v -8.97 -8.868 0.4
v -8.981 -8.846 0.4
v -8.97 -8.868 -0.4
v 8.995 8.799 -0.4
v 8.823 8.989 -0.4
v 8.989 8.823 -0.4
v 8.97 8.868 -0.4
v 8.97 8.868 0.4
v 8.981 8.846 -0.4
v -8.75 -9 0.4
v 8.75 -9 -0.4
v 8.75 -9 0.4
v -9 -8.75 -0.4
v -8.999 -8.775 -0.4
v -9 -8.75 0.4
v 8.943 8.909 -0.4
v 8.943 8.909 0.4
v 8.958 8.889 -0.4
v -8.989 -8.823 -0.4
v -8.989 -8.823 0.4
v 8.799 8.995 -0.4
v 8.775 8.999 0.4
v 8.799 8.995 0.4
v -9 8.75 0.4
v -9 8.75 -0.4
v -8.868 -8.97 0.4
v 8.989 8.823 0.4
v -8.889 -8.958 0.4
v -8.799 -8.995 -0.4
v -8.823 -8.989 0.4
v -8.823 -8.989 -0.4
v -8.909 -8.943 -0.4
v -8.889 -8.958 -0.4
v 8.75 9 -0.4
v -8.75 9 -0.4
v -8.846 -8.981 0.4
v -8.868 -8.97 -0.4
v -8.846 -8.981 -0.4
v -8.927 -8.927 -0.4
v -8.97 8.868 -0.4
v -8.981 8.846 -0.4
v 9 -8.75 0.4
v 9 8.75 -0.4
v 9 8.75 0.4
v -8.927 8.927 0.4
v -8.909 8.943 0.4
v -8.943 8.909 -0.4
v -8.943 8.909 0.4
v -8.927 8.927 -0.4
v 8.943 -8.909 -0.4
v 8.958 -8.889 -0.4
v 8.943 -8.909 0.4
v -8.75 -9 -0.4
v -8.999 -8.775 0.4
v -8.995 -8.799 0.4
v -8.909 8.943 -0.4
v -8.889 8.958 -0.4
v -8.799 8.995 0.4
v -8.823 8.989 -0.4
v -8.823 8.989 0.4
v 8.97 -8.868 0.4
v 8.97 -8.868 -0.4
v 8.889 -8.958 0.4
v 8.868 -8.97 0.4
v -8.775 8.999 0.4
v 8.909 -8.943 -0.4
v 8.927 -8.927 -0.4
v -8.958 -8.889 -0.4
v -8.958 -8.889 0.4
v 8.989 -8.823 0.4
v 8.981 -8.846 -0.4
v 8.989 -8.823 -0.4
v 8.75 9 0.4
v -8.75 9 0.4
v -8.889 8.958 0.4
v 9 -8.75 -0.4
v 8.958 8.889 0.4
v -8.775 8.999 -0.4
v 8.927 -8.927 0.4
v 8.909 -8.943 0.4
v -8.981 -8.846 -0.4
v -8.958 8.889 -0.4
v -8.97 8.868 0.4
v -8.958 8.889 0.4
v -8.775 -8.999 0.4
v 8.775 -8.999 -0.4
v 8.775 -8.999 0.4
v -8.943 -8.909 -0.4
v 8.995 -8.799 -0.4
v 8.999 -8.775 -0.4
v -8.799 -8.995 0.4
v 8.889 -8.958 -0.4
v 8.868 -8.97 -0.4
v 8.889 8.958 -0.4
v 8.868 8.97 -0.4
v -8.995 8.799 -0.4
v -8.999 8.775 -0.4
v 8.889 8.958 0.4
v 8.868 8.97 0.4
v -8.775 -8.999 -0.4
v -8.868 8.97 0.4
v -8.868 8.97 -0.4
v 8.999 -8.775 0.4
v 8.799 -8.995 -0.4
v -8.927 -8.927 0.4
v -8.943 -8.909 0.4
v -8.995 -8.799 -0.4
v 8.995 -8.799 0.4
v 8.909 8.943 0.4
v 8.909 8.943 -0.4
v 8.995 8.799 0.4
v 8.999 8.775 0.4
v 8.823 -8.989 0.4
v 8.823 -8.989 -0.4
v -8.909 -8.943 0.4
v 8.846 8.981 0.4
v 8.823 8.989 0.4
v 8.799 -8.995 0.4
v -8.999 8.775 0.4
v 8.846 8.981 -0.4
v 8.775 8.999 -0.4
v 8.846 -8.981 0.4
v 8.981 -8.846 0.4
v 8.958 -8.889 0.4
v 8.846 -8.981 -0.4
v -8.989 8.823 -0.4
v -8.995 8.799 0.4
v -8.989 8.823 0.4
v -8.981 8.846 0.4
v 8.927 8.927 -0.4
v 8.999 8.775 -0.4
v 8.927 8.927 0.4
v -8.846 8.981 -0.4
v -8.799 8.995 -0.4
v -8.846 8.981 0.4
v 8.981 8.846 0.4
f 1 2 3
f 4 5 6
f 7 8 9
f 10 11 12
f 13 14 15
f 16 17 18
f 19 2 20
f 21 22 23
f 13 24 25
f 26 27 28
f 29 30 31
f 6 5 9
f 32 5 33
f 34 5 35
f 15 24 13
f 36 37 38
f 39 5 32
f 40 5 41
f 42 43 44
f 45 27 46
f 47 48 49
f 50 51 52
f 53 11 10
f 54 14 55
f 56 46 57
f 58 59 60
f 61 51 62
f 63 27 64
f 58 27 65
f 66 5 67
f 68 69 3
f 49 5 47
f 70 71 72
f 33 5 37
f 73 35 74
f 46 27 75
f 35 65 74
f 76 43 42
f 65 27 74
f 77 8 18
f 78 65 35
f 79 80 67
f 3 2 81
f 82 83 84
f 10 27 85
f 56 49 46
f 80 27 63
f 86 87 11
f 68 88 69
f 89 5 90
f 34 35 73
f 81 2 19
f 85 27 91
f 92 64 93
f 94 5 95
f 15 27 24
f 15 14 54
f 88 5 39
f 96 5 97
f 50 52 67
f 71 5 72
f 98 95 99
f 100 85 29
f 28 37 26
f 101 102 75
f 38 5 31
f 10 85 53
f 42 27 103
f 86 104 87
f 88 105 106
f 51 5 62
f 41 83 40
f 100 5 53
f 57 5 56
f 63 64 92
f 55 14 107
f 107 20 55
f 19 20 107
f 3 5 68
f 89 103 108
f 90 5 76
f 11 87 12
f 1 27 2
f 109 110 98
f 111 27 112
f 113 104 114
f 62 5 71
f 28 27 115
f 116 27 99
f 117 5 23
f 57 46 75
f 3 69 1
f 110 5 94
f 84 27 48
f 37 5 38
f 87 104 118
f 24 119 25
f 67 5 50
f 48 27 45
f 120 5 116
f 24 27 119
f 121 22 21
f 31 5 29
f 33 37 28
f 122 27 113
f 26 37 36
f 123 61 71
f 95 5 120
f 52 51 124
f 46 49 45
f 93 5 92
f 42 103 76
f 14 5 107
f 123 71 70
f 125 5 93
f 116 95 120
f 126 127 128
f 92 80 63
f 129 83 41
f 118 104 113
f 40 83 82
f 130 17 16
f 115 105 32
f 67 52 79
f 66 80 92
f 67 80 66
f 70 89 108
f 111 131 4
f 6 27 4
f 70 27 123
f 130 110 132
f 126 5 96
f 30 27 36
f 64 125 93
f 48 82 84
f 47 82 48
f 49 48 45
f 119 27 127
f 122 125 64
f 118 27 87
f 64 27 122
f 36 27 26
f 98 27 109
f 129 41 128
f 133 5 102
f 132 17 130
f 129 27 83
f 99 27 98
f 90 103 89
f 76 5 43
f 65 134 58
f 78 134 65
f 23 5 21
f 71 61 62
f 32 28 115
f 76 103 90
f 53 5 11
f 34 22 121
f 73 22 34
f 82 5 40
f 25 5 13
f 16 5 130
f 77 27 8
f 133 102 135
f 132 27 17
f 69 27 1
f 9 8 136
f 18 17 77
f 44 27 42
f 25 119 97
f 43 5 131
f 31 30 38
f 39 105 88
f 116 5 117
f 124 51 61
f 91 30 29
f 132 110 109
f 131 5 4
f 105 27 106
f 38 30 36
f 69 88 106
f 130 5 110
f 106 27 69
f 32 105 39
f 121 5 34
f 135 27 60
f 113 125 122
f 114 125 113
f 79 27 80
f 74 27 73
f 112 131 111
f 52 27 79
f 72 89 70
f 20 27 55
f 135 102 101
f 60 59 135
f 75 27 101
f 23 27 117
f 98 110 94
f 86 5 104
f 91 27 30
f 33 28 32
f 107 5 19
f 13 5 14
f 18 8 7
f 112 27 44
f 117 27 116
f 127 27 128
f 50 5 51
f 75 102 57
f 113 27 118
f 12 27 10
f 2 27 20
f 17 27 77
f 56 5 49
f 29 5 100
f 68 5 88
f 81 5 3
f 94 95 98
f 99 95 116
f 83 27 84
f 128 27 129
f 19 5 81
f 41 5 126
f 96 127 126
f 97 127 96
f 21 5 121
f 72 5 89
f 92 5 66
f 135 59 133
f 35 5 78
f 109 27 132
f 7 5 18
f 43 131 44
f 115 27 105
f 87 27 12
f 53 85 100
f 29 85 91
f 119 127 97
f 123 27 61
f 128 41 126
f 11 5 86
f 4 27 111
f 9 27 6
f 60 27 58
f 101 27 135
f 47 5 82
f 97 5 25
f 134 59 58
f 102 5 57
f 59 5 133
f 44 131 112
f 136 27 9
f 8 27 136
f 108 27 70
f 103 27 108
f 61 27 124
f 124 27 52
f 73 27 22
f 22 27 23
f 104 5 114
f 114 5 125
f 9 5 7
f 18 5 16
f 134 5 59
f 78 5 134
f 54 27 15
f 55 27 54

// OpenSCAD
// 18.0mm x 18.0mm x 0.8mm PCB (single connected solid)

$fn = 64;

// Parameters (mm)
pcb_L = 18.0;  // length (X)
pcb_W = 18.0;  // width  (Y)
pcb_T = 0.8;   // thickness (Z)

// Small edge chamfer to make thickness visible in renders
chamfer = min(0.25, pcb_T/3, pcb_L/20, pcb_W/20);

module pcb_plate(L, W, T, c) {
    color([0.0, 0.4, 0.2])
    hull() {
        // Four corner posts; hull creates a single connected solid with softened edges
        for (sx = [-1, 1], sy = [-1, 1])
            translate([sx*(L/2 - c), sy*(W/2 - c), 0])
                cylinder(h=T, r=c, center=true);
    }
}

pcb_plate(pcb_L, pcb_W, pcb_T, chamfer);
